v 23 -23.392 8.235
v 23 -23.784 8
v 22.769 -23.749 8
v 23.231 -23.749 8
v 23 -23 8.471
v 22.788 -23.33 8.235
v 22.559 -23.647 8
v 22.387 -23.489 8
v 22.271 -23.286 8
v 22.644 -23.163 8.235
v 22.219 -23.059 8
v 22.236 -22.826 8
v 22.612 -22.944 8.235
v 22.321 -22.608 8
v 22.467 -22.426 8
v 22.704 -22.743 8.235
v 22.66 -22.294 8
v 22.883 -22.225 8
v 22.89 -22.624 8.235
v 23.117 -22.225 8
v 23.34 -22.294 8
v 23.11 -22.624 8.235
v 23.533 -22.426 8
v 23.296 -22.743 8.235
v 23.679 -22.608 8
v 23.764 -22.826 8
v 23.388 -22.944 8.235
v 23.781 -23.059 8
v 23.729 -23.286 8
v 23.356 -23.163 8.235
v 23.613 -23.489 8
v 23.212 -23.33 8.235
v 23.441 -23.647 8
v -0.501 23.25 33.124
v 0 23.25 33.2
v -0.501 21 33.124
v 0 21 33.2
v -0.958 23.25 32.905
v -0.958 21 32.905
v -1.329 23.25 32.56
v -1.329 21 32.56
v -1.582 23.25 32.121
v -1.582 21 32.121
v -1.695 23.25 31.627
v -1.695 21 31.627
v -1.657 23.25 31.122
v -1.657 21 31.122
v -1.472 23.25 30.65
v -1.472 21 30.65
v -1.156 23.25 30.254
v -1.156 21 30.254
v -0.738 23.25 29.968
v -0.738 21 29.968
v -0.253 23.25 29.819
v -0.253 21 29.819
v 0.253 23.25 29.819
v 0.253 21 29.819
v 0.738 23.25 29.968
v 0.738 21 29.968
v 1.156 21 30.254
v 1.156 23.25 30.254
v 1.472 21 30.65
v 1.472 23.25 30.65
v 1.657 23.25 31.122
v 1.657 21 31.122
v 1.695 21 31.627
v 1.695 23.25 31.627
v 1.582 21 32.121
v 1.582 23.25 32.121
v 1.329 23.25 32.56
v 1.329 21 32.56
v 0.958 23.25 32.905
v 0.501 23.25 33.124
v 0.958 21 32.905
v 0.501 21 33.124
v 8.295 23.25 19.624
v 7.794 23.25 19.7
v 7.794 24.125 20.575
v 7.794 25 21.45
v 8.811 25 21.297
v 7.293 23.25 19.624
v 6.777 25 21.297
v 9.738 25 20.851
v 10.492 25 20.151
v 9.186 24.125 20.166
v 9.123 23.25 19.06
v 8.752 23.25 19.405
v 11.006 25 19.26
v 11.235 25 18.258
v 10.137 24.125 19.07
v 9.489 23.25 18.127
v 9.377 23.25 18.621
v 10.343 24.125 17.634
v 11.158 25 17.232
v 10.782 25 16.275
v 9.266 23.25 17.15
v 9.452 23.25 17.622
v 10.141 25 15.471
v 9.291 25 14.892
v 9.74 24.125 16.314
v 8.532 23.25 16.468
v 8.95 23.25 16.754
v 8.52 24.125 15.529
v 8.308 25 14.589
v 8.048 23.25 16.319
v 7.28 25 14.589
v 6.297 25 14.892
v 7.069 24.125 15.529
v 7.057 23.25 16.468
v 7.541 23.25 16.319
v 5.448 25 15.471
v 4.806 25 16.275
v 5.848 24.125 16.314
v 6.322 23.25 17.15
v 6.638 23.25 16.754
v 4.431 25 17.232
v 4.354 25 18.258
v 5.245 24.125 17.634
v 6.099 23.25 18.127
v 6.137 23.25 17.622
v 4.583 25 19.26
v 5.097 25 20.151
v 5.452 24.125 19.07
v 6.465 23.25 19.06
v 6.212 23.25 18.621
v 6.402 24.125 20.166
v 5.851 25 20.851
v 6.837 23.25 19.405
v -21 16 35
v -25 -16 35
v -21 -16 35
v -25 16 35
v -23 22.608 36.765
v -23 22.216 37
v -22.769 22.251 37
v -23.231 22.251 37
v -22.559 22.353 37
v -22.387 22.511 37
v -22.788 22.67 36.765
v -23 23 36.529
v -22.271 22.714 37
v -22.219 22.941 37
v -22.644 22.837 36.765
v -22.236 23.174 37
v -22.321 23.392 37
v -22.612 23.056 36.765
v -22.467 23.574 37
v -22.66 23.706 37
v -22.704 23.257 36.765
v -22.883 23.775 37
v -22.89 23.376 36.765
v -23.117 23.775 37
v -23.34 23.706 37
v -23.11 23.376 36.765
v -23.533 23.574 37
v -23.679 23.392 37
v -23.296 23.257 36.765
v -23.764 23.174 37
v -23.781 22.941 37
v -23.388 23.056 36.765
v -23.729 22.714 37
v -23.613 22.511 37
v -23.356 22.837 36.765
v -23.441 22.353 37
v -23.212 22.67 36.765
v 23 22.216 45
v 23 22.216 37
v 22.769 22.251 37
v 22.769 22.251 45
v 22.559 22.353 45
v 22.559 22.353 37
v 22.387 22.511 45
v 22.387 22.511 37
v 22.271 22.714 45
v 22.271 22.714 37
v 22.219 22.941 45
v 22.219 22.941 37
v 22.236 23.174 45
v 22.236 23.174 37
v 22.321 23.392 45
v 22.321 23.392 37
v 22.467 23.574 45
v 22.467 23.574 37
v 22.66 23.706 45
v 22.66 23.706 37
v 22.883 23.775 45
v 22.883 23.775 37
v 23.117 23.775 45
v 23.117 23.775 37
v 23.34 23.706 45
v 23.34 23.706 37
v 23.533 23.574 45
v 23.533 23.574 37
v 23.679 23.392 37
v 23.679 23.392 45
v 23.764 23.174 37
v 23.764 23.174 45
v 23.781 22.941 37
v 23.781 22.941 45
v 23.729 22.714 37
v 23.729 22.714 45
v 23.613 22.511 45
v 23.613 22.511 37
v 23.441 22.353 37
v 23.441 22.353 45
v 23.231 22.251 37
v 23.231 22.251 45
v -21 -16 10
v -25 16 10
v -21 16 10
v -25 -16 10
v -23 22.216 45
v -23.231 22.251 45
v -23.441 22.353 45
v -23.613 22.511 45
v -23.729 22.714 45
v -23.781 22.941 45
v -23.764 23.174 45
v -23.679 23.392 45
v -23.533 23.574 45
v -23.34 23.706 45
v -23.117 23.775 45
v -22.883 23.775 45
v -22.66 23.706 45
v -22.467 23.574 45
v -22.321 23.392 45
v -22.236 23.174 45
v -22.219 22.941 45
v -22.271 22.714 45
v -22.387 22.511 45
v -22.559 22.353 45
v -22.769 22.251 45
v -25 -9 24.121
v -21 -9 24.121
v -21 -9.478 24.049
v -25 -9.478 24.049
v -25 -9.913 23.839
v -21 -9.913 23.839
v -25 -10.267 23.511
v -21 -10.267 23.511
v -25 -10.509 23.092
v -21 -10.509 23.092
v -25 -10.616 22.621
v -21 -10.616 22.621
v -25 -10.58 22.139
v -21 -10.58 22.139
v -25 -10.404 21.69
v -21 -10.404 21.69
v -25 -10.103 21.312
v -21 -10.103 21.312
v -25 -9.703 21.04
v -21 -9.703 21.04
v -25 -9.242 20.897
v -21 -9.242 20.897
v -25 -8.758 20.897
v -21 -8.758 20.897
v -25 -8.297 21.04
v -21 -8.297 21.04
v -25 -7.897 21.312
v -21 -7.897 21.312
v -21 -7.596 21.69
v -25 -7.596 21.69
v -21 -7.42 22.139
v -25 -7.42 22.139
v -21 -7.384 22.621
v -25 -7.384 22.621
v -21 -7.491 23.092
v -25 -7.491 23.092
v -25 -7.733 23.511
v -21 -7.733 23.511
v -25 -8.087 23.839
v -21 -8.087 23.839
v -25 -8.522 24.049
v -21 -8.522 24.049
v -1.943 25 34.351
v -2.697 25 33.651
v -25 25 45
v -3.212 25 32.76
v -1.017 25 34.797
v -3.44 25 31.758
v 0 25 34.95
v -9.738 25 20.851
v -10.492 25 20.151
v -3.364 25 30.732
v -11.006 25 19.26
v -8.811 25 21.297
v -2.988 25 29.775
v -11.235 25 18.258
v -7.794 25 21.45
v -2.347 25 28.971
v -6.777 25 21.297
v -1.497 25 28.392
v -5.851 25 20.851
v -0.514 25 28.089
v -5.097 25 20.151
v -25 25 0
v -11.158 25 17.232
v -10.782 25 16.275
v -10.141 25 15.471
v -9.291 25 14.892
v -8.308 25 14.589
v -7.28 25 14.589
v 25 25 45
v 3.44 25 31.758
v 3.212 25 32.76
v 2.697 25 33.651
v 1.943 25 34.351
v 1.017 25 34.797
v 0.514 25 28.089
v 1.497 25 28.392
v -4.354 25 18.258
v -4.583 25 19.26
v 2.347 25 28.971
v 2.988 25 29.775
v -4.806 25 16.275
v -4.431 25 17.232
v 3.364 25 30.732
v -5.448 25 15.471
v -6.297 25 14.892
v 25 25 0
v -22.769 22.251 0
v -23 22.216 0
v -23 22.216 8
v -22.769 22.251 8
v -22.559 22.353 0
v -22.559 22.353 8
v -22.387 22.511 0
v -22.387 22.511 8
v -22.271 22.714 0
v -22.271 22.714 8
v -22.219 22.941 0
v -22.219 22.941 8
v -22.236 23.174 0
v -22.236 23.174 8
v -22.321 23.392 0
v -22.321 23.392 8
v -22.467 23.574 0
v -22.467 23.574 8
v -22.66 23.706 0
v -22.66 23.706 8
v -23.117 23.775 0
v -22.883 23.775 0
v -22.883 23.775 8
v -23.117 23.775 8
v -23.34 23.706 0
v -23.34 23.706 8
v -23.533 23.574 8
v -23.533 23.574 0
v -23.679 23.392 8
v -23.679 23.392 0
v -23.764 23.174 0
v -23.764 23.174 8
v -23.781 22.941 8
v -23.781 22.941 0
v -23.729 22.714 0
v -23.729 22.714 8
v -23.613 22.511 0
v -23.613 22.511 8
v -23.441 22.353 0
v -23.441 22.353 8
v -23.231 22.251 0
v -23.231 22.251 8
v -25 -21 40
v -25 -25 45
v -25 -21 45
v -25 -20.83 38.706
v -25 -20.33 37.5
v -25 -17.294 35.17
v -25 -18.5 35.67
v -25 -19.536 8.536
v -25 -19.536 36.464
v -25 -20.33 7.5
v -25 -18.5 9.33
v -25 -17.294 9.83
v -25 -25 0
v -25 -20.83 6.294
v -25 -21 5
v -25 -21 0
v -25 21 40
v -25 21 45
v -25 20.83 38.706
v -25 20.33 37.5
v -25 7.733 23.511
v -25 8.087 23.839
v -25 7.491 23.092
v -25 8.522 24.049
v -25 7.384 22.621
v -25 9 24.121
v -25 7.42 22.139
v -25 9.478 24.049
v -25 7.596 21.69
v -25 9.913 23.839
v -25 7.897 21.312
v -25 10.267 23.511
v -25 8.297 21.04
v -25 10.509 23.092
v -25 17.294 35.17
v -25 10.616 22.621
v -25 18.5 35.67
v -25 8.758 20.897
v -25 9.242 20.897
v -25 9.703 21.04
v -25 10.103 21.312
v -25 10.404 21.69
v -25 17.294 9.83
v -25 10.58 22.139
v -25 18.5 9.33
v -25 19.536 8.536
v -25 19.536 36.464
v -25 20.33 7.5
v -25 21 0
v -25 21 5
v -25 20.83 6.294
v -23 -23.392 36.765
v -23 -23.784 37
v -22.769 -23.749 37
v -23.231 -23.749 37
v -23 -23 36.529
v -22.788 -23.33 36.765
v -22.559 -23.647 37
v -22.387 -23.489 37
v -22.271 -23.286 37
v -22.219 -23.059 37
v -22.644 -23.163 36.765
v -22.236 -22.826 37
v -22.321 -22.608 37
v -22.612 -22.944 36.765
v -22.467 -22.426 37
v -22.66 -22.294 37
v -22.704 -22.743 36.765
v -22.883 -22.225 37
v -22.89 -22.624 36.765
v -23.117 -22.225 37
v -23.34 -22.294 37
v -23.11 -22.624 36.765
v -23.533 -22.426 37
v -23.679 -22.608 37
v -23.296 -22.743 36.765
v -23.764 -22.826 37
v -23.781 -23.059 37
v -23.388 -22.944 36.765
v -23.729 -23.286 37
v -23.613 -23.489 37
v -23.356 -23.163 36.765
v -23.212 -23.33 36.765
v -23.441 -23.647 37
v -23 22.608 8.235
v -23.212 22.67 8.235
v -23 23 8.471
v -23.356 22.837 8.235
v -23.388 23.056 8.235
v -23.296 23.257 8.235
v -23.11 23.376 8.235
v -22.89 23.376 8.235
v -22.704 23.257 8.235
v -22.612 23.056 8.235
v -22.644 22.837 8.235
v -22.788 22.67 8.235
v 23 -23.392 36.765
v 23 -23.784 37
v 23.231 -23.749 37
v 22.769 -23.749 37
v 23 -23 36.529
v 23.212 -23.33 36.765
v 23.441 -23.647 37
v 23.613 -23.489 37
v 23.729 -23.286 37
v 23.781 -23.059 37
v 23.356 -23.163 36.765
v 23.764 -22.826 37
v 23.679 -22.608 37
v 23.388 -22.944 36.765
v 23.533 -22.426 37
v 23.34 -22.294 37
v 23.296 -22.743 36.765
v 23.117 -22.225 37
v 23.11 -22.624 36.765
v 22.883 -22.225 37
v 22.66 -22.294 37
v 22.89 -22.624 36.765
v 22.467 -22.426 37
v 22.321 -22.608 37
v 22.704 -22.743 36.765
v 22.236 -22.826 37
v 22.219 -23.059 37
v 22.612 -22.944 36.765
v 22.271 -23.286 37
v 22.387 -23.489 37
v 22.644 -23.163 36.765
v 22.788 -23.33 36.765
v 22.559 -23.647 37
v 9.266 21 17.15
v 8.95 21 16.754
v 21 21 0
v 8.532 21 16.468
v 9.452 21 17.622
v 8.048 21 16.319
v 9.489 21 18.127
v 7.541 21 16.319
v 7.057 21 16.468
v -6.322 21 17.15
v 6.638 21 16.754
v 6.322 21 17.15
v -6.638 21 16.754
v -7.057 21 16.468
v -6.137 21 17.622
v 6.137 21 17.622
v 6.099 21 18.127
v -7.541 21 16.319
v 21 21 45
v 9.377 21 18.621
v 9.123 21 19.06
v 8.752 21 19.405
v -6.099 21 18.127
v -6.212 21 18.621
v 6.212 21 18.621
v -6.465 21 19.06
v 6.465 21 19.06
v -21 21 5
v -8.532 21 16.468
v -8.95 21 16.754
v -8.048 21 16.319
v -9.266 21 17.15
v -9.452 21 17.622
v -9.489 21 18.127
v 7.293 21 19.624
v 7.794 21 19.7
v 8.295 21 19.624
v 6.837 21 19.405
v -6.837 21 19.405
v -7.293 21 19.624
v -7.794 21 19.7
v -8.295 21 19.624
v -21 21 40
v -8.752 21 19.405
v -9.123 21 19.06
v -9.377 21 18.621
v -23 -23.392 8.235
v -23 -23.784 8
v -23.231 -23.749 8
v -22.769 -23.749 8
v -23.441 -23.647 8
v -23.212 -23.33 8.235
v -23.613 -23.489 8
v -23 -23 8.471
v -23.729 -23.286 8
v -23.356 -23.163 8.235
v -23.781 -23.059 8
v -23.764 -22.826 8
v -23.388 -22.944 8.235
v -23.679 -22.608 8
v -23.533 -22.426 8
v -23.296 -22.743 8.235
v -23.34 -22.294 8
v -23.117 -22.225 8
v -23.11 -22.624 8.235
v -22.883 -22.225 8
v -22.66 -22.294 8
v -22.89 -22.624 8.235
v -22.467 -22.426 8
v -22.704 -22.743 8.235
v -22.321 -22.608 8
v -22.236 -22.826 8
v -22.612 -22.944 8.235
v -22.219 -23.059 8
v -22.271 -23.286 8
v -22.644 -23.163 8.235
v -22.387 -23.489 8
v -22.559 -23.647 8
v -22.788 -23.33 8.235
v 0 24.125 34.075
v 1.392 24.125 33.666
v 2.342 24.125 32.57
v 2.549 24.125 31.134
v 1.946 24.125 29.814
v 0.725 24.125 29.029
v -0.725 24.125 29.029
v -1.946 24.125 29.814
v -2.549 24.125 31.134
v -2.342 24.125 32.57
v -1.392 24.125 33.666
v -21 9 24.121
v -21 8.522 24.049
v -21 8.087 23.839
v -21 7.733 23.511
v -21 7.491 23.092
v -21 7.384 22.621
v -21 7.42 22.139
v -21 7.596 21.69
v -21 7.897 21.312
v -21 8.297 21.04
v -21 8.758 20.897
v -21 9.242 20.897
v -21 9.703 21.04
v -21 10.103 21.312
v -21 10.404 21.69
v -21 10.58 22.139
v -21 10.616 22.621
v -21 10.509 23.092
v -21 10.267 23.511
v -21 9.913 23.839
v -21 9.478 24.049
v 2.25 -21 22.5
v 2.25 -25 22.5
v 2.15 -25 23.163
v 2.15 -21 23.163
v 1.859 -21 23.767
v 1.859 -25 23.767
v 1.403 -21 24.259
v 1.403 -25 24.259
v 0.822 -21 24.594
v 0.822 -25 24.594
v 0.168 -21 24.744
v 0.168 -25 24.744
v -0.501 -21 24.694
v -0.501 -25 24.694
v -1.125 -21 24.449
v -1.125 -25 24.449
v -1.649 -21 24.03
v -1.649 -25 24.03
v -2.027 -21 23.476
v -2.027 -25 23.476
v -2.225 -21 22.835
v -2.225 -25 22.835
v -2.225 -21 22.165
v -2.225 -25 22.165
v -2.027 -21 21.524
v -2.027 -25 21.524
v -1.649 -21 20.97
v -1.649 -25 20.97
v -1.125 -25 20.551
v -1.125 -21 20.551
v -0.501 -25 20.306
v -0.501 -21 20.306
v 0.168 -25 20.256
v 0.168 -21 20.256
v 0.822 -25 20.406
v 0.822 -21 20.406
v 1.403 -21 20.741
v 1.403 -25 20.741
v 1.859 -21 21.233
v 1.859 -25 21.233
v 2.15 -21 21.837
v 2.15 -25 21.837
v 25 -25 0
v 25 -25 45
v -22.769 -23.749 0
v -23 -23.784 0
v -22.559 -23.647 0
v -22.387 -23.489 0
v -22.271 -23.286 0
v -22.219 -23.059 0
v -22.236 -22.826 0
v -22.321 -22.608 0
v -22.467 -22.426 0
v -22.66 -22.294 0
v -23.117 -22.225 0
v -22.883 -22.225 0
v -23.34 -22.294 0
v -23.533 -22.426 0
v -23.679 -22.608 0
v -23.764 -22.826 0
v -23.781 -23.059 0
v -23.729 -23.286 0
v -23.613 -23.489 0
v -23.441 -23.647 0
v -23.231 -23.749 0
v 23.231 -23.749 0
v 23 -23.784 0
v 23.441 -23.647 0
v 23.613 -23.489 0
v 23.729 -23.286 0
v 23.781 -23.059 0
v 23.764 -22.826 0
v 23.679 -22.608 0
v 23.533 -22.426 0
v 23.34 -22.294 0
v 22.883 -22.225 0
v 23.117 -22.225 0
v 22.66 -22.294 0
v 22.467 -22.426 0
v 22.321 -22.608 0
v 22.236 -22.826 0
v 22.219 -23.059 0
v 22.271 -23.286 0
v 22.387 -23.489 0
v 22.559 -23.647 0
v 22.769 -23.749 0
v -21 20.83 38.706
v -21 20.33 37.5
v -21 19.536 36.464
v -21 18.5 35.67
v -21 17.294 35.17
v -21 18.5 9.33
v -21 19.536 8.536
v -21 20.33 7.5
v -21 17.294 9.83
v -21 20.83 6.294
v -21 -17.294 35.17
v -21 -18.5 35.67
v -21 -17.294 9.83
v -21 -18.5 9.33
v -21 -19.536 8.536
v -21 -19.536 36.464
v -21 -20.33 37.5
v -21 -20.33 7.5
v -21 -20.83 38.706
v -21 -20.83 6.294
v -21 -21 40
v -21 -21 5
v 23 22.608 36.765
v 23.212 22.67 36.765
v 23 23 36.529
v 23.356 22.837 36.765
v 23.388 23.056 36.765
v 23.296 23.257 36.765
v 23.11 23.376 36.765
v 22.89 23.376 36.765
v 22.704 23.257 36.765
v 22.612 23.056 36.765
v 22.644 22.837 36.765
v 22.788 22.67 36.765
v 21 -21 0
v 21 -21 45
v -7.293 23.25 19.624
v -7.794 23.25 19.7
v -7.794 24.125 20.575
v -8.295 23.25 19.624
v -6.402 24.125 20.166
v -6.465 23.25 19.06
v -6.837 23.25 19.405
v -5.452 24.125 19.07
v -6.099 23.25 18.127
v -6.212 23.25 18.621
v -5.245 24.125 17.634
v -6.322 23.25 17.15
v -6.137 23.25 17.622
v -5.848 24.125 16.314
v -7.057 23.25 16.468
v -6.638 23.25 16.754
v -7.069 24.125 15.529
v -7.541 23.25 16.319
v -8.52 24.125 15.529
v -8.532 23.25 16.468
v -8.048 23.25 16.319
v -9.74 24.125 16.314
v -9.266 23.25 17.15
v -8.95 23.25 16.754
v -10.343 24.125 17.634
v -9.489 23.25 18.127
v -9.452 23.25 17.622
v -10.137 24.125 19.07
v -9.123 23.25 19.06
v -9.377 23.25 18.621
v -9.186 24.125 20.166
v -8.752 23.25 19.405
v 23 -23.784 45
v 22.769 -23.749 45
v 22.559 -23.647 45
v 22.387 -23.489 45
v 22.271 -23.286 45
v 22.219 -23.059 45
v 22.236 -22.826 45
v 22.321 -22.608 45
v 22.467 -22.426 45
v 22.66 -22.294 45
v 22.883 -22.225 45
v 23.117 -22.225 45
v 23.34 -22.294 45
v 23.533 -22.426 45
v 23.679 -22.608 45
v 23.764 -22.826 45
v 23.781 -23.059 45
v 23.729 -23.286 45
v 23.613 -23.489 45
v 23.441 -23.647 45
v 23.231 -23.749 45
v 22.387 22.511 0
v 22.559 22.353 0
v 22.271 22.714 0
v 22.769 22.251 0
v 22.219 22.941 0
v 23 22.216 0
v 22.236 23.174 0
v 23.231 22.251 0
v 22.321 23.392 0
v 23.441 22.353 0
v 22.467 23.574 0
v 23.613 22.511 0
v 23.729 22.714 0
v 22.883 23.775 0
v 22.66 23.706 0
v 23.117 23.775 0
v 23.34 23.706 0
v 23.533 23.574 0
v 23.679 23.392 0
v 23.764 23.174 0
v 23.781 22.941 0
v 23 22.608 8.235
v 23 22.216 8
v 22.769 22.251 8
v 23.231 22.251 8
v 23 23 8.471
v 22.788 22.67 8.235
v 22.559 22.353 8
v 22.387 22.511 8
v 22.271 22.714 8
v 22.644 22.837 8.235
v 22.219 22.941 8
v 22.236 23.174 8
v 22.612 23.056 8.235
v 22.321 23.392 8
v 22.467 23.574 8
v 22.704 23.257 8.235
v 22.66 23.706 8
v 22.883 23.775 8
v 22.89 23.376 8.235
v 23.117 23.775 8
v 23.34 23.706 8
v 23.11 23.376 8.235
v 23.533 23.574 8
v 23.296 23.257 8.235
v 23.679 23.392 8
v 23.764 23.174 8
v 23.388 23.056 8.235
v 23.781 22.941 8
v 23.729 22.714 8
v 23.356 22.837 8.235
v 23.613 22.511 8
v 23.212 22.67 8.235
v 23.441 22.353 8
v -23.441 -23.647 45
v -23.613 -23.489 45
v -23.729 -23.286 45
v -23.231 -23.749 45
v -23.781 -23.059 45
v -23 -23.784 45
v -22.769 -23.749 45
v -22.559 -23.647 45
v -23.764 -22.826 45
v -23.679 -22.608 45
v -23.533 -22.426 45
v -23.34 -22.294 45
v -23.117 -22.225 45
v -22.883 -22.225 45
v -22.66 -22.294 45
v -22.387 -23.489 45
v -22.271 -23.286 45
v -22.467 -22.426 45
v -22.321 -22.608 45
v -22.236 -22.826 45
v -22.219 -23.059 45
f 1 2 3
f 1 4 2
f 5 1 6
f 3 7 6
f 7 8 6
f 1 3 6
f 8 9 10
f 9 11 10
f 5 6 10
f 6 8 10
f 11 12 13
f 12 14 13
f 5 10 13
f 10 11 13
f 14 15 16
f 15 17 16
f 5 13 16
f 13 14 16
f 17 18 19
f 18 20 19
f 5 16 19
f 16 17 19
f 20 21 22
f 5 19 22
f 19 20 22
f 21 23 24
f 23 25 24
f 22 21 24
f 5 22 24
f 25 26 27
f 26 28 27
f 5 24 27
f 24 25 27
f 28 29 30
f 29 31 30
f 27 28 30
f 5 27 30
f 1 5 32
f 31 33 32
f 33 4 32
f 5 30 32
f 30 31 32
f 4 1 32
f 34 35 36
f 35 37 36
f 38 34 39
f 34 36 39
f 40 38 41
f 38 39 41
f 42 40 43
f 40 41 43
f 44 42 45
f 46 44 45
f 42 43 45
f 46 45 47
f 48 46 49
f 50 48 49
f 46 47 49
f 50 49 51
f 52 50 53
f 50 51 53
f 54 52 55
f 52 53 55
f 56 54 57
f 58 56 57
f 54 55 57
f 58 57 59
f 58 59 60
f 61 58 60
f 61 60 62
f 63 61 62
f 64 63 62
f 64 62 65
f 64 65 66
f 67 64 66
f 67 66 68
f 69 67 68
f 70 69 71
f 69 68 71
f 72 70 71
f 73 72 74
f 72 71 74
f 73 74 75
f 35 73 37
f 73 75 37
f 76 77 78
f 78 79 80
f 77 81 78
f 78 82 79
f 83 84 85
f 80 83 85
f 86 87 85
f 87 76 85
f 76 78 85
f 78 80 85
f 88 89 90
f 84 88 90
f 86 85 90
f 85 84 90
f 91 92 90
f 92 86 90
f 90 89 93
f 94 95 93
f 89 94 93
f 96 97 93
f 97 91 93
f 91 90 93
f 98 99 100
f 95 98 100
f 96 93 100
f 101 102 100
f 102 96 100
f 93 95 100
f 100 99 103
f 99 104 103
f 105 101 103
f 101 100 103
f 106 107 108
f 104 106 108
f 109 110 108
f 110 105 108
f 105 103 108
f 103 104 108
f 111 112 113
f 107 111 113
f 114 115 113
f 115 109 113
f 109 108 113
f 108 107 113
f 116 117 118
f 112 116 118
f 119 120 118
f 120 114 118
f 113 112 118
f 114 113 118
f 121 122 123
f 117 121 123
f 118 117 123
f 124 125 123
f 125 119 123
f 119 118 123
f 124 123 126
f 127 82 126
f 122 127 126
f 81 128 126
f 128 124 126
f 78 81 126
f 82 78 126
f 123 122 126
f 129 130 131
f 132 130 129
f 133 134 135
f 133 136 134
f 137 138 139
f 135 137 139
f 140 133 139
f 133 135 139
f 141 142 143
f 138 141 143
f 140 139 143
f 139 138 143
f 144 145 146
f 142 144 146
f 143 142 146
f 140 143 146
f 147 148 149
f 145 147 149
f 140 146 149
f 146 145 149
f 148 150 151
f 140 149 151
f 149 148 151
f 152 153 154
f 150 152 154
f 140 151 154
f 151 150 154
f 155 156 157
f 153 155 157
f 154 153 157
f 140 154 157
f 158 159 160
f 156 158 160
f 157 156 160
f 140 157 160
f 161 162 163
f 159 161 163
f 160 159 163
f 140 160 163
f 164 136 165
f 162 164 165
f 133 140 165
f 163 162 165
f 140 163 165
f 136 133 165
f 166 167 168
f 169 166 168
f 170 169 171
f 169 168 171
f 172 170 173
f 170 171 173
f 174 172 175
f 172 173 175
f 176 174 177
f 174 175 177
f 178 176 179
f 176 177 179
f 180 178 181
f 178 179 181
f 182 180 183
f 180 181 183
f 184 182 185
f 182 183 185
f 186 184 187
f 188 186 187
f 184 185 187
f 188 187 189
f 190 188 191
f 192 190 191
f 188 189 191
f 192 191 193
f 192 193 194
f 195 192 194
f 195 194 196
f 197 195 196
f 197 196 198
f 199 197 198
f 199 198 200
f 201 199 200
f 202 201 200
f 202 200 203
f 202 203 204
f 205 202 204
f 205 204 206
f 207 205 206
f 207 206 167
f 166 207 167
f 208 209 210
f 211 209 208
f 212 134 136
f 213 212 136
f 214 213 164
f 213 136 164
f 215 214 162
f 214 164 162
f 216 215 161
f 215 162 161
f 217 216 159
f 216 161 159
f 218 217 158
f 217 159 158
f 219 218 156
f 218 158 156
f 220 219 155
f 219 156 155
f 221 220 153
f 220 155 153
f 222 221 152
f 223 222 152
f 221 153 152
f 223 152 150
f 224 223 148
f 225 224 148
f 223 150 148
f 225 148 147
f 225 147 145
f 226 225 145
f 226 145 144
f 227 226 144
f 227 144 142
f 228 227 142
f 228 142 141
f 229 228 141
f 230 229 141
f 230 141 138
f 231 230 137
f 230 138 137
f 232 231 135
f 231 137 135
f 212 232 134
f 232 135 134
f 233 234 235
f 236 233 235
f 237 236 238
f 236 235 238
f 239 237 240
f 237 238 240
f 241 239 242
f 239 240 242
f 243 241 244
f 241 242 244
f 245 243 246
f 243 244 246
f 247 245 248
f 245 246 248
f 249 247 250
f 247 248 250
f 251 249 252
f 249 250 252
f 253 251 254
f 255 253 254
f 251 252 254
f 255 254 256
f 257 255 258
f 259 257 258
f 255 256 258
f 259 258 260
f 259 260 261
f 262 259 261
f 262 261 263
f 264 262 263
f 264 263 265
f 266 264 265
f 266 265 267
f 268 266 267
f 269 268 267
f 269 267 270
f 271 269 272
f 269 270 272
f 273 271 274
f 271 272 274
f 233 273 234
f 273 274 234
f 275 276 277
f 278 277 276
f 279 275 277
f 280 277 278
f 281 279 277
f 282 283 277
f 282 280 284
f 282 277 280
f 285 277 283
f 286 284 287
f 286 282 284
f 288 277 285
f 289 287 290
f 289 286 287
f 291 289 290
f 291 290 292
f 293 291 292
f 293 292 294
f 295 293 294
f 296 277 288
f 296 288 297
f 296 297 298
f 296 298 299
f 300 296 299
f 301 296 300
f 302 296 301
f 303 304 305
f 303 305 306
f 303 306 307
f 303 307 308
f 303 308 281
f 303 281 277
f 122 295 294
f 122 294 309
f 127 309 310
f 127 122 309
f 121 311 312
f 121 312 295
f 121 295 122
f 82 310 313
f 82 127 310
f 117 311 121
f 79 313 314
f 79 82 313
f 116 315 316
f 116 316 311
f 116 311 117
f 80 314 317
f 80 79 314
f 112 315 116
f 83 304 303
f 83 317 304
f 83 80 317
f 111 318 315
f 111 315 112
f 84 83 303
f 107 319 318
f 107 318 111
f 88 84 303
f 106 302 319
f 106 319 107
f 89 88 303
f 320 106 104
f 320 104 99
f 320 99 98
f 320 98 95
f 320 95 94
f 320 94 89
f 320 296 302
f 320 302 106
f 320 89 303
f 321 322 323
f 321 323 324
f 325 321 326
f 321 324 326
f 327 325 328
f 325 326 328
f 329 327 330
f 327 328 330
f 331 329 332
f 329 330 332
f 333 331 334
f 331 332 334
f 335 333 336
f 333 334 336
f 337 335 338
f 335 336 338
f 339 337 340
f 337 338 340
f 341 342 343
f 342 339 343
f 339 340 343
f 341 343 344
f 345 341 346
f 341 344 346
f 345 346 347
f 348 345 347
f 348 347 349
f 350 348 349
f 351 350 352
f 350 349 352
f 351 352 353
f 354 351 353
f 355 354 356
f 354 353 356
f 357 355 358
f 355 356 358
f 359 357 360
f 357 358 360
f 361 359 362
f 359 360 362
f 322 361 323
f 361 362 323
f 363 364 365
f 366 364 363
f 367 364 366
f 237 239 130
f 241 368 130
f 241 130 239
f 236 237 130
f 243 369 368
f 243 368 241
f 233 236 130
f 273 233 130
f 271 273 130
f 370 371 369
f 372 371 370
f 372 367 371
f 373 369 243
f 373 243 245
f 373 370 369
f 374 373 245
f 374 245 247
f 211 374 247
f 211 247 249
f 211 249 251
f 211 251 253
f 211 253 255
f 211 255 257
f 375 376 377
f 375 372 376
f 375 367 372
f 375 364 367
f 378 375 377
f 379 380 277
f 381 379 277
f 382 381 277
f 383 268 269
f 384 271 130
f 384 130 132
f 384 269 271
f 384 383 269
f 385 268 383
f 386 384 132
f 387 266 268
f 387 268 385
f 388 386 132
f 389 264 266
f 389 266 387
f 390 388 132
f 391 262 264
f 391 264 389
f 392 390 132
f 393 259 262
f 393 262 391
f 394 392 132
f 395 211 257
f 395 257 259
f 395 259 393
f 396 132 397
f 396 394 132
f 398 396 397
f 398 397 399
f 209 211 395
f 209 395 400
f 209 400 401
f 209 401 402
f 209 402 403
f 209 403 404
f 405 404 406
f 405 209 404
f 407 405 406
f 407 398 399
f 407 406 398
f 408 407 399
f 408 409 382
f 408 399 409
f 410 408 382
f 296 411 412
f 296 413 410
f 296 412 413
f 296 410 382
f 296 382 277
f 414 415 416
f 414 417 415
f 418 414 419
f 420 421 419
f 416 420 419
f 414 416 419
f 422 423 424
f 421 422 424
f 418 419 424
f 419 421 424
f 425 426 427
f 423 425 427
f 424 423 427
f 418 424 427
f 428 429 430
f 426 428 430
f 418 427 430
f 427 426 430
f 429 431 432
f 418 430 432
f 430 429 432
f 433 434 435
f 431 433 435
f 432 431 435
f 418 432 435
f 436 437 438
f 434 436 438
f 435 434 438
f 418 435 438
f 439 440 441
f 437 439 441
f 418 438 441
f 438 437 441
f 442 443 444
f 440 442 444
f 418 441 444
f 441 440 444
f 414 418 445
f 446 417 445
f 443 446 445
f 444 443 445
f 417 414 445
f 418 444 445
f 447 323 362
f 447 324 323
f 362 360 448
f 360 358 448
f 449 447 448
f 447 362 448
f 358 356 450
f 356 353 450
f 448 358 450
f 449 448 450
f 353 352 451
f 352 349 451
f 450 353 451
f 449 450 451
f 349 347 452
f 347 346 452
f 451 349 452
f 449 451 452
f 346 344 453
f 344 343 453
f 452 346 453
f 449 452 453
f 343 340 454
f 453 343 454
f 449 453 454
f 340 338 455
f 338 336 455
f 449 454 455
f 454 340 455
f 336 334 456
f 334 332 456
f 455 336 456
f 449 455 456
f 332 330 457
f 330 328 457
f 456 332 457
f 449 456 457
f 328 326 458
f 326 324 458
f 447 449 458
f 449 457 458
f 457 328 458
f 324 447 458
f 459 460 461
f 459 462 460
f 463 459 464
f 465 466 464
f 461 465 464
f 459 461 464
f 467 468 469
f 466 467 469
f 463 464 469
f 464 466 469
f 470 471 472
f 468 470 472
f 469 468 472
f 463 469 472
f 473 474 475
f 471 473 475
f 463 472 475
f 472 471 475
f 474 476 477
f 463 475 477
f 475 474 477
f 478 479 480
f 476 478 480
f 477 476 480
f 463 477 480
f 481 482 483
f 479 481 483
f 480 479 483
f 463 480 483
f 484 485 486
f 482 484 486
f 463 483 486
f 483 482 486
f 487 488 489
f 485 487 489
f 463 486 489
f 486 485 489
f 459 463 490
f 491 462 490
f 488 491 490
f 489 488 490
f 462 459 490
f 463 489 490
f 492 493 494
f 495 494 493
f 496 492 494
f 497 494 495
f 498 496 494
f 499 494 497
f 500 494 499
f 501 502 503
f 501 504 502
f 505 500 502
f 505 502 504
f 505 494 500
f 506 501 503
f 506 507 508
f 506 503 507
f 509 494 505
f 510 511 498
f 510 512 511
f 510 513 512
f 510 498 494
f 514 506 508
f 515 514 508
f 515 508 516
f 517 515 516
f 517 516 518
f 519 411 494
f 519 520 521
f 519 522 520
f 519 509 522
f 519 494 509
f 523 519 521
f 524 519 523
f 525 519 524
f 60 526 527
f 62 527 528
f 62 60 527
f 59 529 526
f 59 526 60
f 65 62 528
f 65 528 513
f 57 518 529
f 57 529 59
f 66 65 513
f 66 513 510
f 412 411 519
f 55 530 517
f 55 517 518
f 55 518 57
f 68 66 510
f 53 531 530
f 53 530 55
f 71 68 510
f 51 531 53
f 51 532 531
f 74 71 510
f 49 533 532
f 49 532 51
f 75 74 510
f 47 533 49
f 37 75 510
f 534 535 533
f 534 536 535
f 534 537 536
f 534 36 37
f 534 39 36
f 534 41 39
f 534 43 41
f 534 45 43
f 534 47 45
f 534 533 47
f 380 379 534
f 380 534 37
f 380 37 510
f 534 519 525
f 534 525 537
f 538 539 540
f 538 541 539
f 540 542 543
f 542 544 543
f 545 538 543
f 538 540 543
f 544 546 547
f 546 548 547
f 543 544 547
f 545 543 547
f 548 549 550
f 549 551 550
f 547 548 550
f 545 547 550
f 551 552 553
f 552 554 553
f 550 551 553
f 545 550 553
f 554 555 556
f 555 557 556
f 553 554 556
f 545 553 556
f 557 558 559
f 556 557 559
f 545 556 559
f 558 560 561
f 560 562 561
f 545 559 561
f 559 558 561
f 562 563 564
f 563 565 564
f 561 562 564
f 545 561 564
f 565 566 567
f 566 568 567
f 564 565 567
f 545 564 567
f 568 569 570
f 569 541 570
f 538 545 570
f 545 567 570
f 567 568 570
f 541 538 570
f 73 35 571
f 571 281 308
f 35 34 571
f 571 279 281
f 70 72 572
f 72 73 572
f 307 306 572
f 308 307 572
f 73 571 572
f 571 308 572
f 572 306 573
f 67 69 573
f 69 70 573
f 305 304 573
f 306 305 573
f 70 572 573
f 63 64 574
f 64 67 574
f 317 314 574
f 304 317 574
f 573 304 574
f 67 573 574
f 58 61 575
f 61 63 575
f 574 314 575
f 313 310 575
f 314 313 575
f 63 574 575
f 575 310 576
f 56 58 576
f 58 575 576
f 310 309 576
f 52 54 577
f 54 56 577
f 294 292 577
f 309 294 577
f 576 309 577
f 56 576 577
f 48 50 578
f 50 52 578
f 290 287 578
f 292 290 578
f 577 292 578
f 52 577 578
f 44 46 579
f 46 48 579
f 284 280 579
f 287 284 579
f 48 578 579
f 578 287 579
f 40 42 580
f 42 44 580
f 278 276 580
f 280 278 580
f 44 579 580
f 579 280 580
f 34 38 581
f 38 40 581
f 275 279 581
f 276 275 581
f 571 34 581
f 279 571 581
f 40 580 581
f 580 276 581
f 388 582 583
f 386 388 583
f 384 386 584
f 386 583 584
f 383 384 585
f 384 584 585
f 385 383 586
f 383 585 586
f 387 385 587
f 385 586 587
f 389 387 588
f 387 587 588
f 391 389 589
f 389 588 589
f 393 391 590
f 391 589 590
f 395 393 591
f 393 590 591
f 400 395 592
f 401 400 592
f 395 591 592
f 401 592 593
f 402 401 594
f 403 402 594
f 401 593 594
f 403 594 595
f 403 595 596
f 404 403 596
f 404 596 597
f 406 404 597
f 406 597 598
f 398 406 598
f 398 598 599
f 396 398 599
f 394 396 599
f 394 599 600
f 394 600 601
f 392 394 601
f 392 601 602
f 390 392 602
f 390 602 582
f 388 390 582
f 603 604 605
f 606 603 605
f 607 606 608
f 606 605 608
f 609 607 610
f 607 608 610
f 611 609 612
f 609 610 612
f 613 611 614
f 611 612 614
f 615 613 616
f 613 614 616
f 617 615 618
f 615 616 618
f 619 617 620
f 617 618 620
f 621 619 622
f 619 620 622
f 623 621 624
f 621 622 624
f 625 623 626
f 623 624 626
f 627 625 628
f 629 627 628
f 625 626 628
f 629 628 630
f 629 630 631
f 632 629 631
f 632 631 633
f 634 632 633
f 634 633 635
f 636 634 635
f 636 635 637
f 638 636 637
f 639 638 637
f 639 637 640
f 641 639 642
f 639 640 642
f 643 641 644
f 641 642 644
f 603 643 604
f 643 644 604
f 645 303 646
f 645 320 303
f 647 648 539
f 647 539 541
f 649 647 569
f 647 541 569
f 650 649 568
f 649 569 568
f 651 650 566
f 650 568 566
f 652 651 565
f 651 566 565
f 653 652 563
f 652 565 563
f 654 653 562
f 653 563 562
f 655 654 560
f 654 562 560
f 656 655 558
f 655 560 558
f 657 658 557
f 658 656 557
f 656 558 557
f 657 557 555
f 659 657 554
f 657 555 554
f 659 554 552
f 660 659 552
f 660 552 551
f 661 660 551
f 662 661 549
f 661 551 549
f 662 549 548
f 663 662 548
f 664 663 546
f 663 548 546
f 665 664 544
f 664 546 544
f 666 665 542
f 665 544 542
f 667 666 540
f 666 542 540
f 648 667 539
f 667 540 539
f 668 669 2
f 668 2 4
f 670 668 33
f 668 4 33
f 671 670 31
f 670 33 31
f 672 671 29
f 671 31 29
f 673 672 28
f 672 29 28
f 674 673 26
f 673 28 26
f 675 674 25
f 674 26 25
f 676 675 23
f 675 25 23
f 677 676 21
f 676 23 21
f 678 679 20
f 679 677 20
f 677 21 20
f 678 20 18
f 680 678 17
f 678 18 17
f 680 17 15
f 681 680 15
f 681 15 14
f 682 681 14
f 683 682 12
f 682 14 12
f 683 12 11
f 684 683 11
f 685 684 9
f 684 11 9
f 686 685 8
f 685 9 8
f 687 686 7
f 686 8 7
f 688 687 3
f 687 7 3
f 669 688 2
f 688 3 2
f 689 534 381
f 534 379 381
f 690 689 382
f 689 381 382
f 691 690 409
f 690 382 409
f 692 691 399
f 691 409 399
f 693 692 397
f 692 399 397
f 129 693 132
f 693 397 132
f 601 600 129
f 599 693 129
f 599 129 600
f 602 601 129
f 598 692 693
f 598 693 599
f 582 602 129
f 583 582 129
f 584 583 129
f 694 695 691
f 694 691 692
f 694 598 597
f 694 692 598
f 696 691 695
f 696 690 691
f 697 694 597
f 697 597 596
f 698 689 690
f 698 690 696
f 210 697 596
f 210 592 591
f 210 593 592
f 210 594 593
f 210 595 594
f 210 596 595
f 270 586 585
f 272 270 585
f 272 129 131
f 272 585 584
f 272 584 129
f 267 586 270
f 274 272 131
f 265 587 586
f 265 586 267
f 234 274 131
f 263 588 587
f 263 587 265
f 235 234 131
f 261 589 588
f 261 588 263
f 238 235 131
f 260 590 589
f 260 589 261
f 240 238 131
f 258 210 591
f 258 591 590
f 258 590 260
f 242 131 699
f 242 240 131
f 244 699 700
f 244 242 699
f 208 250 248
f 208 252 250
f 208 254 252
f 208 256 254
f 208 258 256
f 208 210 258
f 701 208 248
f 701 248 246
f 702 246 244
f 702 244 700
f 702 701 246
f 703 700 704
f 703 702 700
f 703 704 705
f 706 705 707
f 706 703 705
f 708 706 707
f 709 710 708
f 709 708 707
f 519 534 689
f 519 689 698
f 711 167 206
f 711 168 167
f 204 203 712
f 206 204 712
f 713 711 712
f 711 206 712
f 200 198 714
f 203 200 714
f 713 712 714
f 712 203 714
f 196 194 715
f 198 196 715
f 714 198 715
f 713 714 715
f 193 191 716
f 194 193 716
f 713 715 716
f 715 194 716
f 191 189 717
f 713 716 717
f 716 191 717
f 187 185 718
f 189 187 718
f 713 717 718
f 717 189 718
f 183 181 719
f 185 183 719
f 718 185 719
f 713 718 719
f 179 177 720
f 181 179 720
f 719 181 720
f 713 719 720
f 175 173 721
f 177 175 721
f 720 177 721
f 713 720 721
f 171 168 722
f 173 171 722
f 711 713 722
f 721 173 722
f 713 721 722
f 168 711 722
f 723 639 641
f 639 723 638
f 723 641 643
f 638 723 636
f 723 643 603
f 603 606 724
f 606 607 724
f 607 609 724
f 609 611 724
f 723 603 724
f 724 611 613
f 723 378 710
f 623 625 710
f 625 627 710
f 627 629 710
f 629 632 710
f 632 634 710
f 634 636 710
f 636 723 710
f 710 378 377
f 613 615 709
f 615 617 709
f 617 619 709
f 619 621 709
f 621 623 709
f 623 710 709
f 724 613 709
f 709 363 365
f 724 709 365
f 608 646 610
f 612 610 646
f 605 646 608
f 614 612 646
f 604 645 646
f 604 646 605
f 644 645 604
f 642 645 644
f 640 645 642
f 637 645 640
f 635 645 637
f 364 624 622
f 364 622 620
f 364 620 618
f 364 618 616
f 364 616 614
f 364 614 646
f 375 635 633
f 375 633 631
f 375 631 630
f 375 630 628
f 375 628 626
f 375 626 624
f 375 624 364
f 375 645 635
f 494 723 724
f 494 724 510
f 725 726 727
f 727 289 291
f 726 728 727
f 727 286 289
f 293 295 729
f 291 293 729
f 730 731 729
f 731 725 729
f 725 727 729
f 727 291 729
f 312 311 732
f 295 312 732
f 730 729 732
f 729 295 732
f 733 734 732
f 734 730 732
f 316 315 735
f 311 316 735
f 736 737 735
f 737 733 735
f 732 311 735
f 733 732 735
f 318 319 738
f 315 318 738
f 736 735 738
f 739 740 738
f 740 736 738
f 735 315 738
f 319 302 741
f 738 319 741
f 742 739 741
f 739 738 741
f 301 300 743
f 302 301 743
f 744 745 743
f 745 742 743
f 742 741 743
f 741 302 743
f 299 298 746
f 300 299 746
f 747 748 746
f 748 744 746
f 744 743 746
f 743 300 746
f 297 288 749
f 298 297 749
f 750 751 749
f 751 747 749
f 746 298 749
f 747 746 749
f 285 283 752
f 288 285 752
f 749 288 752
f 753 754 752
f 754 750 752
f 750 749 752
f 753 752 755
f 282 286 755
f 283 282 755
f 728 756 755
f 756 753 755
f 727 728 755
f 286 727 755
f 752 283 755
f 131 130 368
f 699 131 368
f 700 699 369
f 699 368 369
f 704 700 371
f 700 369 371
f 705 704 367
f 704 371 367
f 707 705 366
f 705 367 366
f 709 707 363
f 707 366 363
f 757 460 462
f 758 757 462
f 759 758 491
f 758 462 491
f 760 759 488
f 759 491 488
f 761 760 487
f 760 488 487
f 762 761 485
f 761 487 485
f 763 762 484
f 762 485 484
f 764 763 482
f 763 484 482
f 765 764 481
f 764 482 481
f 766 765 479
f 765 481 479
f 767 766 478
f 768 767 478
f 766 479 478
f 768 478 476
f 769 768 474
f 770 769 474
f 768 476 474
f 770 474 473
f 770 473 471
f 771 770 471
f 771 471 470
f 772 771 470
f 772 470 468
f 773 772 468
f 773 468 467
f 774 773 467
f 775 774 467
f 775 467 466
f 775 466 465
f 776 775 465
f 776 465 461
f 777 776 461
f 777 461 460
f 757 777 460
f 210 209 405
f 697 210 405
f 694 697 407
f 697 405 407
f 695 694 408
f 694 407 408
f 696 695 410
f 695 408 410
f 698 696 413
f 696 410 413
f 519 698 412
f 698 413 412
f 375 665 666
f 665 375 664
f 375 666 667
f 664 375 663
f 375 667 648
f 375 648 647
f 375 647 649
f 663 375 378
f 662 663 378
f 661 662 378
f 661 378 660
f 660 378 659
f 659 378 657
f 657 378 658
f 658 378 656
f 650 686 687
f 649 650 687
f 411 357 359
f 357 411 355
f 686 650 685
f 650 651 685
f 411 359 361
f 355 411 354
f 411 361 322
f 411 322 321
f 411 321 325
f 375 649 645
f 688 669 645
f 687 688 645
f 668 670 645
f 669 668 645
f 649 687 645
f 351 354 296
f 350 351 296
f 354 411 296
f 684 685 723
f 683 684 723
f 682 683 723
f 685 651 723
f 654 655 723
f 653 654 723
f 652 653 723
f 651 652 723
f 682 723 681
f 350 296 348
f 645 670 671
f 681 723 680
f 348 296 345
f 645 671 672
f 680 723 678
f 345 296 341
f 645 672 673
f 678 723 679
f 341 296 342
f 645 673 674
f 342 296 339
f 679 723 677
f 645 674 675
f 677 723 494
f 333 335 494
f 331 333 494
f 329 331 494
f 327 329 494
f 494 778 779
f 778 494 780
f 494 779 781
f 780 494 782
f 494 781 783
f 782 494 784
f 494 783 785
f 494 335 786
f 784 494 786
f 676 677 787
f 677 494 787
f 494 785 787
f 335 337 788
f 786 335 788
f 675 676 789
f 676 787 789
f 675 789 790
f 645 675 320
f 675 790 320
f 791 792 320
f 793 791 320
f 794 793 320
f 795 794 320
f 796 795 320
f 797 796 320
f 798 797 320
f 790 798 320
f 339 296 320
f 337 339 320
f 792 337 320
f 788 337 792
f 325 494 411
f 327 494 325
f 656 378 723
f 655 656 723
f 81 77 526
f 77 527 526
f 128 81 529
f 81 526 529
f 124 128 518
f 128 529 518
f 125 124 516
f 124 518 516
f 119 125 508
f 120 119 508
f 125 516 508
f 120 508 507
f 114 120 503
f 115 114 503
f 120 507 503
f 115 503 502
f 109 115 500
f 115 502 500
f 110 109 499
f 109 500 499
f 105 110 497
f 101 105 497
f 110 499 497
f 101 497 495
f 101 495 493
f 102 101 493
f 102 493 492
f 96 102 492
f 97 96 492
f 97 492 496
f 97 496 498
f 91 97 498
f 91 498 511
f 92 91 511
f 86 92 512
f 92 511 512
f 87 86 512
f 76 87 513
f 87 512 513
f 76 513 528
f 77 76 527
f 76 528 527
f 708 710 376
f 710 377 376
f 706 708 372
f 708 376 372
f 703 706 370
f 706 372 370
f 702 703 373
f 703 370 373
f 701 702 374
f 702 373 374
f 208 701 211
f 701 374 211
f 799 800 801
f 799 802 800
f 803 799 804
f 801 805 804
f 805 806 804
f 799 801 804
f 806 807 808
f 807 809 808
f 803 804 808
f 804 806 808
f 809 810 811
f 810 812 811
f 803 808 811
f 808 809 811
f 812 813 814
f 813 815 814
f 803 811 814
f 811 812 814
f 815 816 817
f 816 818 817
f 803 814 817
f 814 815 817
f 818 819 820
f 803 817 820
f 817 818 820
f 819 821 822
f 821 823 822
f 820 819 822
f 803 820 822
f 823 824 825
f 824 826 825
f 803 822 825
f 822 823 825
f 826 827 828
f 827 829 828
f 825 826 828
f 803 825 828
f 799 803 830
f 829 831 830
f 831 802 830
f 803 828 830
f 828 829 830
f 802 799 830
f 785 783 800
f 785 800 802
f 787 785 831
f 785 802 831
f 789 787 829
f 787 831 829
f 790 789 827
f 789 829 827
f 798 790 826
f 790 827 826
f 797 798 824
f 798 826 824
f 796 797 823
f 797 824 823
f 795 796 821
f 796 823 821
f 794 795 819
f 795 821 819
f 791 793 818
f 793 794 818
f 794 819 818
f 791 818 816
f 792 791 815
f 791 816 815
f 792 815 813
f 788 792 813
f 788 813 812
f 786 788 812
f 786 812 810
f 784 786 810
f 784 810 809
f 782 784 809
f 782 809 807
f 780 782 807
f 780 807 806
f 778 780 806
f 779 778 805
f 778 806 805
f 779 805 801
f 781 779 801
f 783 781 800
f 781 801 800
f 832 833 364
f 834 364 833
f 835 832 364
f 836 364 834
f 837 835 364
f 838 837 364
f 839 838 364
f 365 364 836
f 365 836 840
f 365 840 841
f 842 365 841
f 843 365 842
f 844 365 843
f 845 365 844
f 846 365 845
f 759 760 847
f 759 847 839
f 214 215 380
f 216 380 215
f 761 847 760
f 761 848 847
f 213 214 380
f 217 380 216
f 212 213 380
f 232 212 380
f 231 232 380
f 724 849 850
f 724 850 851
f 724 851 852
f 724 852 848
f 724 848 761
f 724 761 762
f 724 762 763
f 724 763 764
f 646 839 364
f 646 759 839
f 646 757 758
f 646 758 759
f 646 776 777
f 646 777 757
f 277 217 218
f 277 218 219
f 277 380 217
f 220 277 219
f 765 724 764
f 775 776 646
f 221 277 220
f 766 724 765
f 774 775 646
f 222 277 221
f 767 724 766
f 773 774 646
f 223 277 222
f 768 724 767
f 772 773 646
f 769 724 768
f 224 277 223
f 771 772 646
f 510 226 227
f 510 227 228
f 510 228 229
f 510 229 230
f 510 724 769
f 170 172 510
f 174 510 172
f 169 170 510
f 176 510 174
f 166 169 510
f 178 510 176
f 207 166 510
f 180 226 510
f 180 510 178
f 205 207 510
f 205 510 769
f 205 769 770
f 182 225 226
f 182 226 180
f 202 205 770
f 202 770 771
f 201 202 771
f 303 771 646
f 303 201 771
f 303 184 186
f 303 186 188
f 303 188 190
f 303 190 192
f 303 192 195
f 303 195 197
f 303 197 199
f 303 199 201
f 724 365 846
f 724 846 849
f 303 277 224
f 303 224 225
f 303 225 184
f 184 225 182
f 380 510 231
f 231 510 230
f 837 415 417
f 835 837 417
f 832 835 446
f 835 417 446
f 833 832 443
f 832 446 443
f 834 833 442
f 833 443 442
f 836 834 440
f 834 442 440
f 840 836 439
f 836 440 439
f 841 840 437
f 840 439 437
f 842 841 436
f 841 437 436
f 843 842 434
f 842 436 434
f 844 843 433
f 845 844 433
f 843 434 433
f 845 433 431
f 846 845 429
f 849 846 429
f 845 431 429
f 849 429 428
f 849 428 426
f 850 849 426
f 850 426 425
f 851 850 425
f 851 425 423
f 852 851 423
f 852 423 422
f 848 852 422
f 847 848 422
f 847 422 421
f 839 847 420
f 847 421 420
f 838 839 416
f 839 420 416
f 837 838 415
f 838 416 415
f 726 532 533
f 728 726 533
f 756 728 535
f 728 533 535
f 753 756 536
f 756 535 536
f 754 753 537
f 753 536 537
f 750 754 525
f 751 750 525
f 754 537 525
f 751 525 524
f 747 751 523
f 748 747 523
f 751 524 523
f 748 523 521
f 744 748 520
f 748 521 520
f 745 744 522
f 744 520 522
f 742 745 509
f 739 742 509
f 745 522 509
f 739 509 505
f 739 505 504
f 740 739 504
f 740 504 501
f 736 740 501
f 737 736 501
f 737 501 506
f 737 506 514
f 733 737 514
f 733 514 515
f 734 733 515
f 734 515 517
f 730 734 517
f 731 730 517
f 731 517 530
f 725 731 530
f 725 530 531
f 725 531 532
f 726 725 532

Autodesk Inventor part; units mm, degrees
ref_plane "YZ Plane" through (0, 0, 0) normal (1, 0, 0) x (0, 1, 0)
ref_plane "XZ Plane" through (0, 0, 0) normal (0, 1, 0) x (-1, 0, 0)
sketch "Skizze1" plane through (0, 0, 0) normal (0, 0, 1) x (1, 0, 0)
  line L0 (-25, 25) -> (25, 25)
  line L1 (25, 25) -> (25, -25)
  line L2 (25, -25) -> (-25, -25)
  line L3 (-25, -25) -> (-25, 25)
  line L4 (-35, 0) -> (35, 0) projected
  line L5 (0, -35) -> (0, 35) projected
  line L6 (21, 21) -> (-21, 21)
  line L7 (-21, 21) -> (-21, -21)
  line L8 (-21, -21) -> (21, -21)
  line L9 (21, -21) -> (21, 21)
  point P0 (0, 0)
  dimension "d0" = 50
  dimension "d1" = 50
  dimension "d2" = 4
extrude "Extrusion1" add sketch "Skizze1" along normal blind 45 contours L0 L5 L6 L7 L4 L3 | L0 L1 L4 L9 L6 L5 | L4 L7 L8 L5 L2 L3 | L1 L2 L5 L8 L9 L4
sketch "Skizze2" plane through (-25, -25, 0) normal (-1, 0, 0) x (0, 0, 1)
  line L0 (0, 50) -> (45, 50) projected
  line L1 (0, 0) -> (45, 0) projected
  line L2 (22.5, 50) -> (22.5, 0)
  line L3 (0, 46) -> (45, 46) projected
  line L4 (0, 4) -> (45, 4) projected
  line L5 (0, 46) -> (5, 46)
  line L6 (10, 41) -> (10, 9)
  line L7 (5, 4) -> (0, 4)
  line L8 (0, 4) -> (0, 46)
  line L9 (45, 4) -> (40, 4)
  line L10 (35, 9) -> (35, 41)
  line L11 (40, 46) -> (45, 46)
  line L12 (45, 46) -> (45, 4)
  arc A0 (40, 46) -> (35, 41) centre (40, 41) ccw
  arc A1 (35, 9) -> (40, 4) centre (40, 9) ccw
  arc A2 (5, 4) -> (10, 9) centre (5, 9) ccw
  arc A3 (10, 41) -> (5, 46) centre (5, 41) ccw
  point P0 (0, 25)
  point P1 (10, 4)
  point P2 (35, 46)
  dimension "d5" = 25
  dimension "d6" = 5
extrude "Extrusion2" cut sketch "Skizze2" against normal up to surface (46 mm away) contours A3 L6 A2 L4 L8 L3 | L3 L12 L4 A1 L10 A0
sketch "Skizze3" plane through (-25, 25, 0) normal (0, 1, 0) x (1, 0, 0)
  line L0 (0, -45) -> (50, -45) projected
  line L1 (50, 0) -> (50, -45) projected
  line L2 (0, 0) -> (0, -45) projected
  line L3 (50, -22.5) -> (0, -22.5)
  line L4 (25, -45) -> (25, 0)
  circle A0 centre (25, -22.5) radius 9
  line L5 (25, -22.5) -> (17.2058, -18)
  line L6 (25, -22.5) -> (32.7942, -18)
  point P0 (25, -31.5)
  dimension "d9" = 18
  dimension "d10" = 120
  dimension "d11" = 120
hole "Bohrung1" at (0, 25, 31.5) at (-7.7942, 25, 18) at (7.7942, 25, 18) direction (0, -1, 0) diameter 3.4 end up to surface countersink diameter 6.9 countersink angle 90
sketch "Skizze4" plane through (-25, -25, 0) normal (0, -1, 0) x (1, 0, 0)
  line L0 (50, 45) -> (0, 45) projected
  line L1 (0, 0) -> (0, 45) projected
  line L2 (50, 0) -> (50, 45) projected
  line L3 (0, 22.5) -> (50, 22.5)
  line L4 (25, 45) -> (25, 0)
  circle A0 centre (25, 22.5) radius 2.25
  dimension "d19" = 4.5
extrude "Extrusion3" cut sketch "Skizze4" against normal up to surface (46 mm away) contours A0 L3 L4 | L4 L3 A0 | A0 L4 L3 | L4 A0 L3
sketch "Skizze5" plane through (-25, 21, 0) normal (-1, 0, 0) x (0, 0, 1)
  circle A0 centre (22.5, -30) radius 2.25 projected
  circle A1 centre (22.5, -12) radius 2.25 projected
  line L0 (35, -35) -> (35, -6) projected
  line L1 (10, -6) -> (35, -6) projected
  line L2 (10, -6) -> (10, -35) projected
  arc A2 (5, -40) -> (10, -35) centre (5, -35) ccw projected
  line L3 (5, -40) -> (40, -40) projected
  arc A3 (35, -35) -> (40, -40) centre (40, -35) ccw projected
  point P0 (0, -21)
hole "Bohrung2" at (-25, 9, 22.5) at (-25, -9, 22.5) direction (1, 0, 0) diameter 3.242 end up to surface thread size "M4x0.7" class "6H" standard "ISO Metric profile"
sketch "Skizze6" plane through (0, 0, 45) normal (0, 0, 1) x (1, 0, 0)
  line L0 (-25, -25) -> (-25, -21) projected
  line L1 (25, -25) -> (-25, -25) projected
  line L2 (25, 25) -> (25, -25) projected
  line L3 (-25, 25) -> (25, 25) projected
  line L4 (-25, 21) -> (-25, 25) projected
  line L5 (-25, 23) -> (25, 23)
  line L6 (23, 25) -> (23, -25)
  line L7 (-25, -23) -> (25, -23)
  line L8 (-23, 25) -> (-23, -25)
  point P0 (0, 0)
  point P1 (-23, 23)
  point P2 (23, 23)
  point P3 (23, -23)
  point P4 (-23, -23)
  dimension "d29" = 2
  dimension "d30" = 2
hole "Bohrung3" at (-23, 23, 45) at (23, 23, 45) at (23, -23, 45) at (-23, -23, 45) direction (0, 0, -1) diameter 1.567 depth 8 tip angle 118 thread size "M2x0.4" class "6H" standard "ISO Metric profile"
ref_plane "Arbeitsebene1" through (0, 0, 22.5) normal (0, 0, 1) x (1, 0, 0)
mirror "Spiegeln1" about plane through (0, 0, 22.5) normal (0, 0, 1) of "Bohrung3"
properties part number "1_0204_001"
